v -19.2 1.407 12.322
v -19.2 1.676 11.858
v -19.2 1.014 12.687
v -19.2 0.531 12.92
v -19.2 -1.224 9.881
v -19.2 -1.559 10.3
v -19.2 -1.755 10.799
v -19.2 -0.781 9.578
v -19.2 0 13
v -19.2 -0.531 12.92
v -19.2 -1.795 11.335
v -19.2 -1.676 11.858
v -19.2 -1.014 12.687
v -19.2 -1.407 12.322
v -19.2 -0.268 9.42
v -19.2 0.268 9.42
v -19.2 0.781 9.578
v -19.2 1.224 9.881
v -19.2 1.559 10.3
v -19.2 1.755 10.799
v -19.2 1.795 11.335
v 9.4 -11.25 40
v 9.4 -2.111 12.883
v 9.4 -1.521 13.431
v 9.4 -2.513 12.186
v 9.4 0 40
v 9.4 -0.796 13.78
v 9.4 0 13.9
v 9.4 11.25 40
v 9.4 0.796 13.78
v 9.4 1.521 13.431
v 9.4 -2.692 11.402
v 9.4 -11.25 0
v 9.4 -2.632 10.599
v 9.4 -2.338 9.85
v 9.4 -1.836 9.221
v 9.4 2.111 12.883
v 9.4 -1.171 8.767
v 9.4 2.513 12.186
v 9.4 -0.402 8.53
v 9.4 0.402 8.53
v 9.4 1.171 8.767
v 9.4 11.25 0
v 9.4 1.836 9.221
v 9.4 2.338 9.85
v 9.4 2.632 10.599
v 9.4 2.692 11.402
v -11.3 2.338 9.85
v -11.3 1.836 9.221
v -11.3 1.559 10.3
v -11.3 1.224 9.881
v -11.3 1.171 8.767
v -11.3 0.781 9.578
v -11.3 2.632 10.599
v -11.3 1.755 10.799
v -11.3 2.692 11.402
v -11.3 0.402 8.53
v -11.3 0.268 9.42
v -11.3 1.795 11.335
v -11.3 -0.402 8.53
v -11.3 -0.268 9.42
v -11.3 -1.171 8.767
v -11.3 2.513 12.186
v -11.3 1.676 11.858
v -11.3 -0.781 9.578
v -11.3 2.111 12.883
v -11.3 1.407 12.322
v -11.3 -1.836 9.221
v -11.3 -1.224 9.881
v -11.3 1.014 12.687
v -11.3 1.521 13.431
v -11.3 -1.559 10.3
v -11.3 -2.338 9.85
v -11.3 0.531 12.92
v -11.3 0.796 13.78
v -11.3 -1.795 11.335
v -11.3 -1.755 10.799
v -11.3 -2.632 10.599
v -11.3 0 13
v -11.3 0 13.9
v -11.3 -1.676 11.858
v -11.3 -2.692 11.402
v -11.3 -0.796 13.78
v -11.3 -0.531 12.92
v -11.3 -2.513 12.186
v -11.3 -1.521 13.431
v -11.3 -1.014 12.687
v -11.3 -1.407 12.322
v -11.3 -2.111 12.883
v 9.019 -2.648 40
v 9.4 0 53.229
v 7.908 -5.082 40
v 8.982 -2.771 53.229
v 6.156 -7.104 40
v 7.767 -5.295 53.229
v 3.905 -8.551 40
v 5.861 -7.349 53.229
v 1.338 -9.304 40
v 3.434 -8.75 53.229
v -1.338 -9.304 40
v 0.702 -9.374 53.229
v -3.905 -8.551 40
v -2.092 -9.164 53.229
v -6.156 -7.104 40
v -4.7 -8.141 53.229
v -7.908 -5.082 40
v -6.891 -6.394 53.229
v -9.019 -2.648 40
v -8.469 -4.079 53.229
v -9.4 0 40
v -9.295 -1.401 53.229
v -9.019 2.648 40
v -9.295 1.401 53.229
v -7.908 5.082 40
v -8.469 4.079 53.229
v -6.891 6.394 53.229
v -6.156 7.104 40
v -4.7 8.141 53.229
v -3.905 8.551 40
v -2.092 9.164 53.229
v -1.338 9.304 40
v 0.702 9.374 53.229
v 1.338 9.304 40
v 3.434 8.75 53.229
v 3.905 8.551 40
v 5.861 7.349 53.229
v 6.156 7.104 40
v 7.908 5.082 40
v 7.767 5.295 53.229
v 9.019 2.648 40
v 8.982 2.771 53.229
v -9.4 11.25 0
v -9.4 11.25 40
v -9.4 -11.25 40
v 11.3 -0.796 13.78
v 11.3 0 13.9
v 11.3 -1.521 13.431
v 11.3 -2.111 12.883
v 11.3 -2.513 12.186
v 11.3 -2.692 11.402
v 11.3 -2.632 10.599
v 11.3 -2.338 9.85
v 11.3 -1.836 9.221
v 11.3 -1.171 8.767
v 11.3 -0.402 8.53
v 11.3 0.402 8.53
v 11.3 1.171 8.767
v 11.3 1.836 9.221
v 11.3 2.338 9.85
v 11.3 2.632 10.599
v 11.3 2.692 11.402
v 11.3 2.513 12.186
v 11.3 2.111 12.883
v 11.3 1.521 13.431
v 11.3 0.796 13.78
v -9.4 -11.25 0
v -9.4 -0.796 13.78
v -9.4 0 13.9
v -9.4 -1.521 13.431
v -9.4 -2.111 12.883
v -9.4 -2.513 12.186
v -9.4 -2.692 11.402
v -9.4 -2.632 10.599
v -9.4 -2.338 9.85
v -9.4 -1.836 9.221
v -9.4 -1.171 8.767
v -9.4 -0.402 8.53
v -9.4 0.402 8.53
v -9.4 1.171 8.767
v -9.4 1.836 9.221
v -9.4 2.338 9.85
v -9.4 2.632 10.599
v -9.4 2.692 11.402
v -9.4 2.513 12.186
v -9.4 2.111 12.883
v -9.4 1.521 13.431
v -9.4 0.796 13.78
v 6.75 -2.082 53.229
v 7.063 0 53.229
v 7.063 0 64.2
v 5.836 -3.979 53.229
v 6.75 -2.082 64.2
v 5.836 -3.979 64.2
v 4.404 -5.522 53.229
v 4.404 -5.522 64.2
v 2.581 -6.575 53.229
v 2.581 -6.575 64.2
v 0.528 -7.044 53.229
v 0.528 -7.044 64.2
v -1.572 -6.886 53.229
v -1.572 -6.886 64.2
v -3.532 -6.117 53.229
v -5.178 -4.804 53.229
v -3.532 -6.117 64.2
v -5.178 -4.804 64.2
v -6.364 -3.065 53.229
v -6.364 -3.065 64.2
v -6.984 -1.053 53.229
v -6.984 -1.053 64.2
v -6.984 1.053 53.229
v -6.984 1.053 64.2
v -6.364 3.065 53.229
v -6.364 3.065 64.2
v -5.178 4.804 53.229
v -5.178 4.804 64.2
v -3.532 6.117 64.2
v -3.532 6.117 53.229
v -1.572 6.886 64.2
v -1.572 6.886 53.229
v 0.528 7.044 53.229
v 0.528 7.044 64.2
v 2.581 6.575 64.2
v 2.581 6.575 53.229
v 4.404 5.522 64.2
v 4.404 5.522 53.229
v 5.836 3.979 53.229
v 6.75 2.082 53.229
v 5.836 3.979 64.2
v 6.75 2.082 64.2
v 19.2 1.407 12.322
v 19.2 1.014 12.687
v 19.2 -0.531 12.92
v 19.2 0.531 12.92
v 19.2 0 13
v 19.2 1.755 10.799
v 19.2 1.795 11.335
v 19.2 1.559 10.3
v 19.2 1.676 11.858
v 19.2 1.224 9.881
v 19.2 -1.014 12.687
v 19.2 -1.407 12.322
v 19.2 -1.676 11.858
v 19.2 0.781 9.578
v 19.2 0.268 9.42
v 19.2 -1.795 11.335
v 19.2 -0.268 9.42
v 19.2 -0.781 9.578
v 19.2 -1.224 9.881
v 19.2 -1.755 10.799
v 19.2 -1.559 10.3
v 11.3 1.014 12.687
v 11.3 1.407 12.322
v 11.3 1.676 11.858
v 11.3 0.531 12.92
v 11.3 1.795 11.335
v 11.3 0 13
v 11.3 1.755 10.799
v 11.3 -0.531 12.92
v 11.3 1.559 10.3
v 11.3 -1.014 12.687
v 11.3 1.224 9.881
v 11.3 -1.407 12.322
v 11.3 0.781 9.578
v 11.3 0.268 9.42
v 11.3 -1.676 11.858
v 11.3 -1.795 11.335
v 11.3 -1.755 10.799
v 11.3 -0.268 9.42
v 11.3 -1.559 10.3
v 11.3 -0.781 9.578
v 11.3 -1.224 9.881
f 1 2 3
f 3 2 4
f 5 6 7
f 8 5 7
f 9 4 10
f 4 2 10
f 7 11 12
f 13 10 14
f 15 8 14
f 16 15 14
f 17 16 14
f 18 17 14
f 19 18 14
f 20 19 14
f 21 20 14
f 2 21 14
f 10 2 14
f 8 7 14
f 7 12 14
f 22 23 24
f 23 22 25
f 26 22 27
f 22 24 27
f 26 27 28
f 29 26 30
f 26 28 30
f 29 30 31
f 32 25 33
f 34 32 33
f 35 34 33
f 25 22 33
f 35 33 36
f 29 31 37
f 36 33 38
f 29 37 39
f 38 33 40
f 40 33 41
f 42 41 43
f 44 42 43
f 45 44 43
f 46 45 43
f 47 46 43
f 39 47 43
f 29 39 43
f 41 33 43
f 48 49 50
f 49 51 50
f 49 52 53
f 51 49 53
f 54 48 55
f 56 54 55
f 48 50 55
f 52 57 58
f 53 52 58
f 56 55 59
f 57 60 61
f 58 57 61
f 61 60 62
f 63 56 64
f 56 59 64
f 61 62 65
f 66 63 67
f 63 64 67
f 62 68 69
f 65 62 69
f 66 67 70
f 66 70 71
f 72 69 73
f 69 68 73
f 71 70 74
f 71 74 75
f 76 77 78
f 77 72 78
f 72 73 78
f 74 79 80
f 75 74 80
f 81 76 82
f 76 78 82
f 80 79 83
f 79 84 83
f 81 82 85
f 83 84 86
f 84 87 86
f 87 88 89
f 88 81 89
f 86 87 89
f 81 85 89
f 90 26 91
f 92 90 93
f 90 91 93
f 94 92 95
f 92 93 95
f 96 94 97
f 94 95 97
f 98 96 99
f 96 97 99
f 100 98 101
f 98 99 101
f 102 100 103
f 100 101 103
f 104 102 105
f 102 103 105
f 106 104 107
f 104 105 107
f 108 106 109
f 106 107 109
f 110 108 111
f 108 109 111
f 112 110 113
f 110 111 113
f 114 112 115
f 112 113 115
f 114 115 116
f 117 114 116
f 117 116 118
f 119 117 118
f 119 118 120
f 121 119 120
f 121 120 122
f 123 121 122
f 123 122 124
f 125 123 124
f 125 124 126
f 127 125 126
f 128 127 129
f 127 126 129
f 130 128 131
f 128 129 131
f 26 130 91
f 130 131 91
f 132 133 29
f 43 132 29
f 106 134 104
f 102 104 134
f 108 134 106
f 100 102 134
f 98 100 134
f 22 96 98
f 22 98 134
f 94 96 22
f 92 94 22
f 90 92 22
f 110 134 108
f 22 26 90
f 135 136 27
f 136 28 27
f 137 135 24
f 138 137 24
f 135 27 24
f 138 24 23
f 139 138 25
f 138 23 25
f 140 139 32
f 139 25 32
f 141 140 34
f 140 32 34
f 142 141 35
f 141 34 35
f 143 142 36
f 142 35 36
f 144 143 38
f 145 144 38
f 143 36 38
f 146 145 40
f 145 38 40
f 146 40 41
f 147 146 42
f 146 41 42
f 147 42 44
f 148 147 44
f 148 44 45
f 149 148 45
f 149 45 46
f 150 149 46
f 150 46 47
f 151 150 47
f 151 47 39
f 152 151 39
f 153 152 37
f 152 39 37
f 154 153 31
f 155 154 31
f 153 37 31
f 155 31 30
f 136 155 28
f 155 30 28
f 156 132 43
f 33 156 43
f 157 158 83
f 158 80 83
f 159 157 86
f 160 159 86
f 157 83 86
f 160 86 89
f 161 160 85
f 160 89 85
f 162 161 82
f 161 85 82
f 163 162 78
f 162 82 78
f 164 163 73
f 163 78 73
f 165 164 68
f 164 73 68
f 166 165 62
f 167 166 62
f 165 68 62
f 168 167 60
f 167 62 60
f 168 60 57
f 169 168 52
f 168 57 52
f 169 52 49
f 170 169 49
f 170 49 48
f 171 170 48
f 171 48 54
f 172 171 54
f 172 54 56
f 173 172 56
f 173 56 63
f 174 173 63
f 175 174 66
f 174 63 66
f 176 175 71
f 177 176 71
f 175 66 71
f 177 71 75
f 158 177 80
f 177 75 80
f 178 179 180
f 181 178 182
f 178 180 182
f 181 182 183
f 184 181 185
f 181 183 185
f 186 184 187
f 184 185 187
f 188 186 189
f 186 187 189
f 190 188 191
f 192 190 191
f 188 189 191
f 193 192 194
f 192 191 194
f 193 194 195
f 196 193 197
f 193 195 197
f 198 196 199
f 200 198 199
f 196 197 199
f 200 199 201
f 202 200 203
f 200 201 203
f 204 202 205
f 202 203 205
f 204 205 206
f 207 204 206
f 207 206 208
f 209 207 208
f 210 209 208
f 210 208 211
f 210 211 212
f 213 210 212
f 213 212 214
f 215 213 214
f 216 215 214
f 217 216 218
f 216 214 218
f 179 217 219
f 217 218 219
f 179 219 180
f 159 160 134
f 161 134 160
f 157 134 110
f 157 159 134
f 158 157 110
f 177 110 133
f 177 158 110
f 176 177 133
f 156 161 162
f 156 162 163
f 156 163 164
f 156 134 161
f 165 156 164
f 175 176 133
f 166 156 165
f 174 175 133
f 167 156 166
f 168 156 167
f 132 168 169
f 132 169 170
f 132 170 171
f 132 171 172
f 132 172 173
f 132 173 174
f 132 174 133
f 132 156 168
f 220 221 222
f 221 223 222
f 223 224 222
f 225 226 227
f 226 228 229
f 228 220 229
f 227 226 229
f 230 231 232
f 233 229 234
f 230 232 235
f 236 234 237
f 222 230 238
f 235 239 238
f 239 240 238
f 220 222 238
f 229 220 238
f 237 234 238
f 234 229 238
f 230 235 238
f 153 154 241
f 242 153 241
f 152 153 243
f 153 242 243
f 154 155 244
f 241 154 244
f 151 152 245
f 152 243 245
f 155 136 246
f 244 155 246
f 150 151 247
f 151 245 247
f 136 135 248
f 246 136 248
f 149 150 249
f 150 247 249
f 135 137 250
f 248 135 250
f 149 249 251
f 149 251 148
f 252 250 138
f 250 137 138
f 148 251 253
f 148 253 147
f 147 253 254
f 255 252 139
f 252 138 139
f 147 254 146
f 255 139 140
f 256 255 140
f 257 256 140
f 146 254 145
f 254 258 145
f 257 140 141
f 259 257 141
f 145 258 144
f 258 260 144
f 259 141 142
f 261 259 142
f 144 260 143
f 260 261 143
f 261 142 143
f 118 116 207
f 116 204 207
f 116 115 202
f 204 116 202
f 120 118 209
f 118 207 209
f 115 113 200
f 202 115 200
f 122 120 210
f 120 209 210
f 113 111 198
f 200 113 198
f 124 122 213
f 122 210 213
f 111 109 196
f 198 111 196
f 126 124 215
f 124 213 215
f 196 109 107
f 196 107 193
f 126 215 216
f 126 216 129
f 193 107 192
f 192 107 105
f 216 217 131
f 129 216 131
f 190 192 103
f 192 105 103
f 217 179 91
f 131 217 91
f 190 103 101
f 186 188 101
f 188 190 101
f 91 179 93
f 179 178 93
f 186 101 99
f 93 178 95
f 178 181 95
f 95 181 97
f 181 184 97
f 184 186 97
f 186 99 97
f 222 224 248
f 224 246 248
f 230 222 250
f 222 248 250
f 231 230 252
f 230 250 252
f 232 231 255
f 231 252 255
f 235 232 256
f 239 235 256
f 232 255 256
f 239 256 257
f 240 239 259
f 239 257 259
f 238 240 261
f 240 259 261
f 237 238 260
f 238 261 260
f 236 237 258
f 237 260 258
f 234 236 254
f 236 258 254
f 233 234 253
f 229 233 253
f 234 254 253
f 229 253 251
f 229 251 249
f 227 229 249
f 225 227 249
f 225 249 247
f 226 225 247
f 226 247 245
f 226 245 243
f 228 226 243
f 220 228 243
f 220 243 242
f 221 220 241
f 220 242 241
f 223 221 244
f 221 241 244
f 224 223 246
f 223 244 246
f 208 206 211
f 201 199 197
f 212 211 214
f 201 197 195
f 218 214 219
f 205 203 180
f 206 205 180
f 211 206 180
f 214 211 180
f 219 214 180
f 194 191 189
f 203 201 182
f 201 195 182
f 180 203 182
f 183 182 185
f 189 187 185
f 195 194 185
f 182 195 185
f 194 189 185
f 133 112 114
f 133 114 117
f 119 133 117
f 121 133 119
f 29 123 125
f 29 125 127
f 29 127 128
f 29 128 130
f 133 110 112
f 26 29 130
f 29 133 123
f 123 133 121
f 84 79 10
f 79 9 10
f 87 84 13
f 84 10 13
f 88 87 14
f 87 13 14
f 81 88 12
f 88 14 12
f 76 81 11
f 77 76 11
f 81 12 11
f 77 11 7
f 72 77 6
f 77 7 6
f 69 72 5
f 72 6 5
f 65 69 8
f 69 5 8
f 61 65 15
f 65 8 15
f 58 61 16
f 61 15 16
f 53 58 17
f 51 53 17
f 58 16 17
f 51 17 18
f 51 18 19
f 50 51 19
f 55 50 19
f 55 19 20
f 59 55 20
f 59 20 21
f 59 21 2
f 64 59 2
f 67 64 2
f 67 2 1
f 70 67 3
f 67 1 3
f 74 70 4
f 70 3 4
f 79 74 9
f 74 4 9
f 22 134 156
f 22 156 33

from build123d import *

# Parameters (mm, degrees)
F0_W     = 18.8
F0_H     = 22.5
F1_DEPTH = 40


with BuildPart() as f1:
    # F0 (on Top) → F1 (new body)
    with BuildSketch(Plane.XY):
        Rectangle(F0_W, F0_H)
    extrude(amount=F1_DEPTH)

    # F2 (on Front) → F3 (revolve)
    with BuildSketch(Plane.XZ):
        Polygon((7.063377, 64.2), (0, 64.2), (0, 40), (9.4, 40), (9.4, 53.229246), (7.063377, 53.229246), align=None)
    revolve(axis=Axis((0, 0, 52.1), (0, 0, -1)))

    # F4 (on Front) → F5 (revolve)
    with BuildSketch(Plane.XZ):
        Polygon((11.3, 13.9), (9.4, 13.9), (9.4, 11.2), (19.2, 11.2), (19.2, 13), (11.3, 13), align=None)
        Polygon((-19.2, 11.2), (-9.4, 11.2), (-9.4, 13.9), (-11.3, 13.9), (-11.3, 13), (-19.2, 13), align=None)
    revolve(axis=Axis((-0.119775, 0, 11.2), (1, 0, 0)))


solid = f1.part
